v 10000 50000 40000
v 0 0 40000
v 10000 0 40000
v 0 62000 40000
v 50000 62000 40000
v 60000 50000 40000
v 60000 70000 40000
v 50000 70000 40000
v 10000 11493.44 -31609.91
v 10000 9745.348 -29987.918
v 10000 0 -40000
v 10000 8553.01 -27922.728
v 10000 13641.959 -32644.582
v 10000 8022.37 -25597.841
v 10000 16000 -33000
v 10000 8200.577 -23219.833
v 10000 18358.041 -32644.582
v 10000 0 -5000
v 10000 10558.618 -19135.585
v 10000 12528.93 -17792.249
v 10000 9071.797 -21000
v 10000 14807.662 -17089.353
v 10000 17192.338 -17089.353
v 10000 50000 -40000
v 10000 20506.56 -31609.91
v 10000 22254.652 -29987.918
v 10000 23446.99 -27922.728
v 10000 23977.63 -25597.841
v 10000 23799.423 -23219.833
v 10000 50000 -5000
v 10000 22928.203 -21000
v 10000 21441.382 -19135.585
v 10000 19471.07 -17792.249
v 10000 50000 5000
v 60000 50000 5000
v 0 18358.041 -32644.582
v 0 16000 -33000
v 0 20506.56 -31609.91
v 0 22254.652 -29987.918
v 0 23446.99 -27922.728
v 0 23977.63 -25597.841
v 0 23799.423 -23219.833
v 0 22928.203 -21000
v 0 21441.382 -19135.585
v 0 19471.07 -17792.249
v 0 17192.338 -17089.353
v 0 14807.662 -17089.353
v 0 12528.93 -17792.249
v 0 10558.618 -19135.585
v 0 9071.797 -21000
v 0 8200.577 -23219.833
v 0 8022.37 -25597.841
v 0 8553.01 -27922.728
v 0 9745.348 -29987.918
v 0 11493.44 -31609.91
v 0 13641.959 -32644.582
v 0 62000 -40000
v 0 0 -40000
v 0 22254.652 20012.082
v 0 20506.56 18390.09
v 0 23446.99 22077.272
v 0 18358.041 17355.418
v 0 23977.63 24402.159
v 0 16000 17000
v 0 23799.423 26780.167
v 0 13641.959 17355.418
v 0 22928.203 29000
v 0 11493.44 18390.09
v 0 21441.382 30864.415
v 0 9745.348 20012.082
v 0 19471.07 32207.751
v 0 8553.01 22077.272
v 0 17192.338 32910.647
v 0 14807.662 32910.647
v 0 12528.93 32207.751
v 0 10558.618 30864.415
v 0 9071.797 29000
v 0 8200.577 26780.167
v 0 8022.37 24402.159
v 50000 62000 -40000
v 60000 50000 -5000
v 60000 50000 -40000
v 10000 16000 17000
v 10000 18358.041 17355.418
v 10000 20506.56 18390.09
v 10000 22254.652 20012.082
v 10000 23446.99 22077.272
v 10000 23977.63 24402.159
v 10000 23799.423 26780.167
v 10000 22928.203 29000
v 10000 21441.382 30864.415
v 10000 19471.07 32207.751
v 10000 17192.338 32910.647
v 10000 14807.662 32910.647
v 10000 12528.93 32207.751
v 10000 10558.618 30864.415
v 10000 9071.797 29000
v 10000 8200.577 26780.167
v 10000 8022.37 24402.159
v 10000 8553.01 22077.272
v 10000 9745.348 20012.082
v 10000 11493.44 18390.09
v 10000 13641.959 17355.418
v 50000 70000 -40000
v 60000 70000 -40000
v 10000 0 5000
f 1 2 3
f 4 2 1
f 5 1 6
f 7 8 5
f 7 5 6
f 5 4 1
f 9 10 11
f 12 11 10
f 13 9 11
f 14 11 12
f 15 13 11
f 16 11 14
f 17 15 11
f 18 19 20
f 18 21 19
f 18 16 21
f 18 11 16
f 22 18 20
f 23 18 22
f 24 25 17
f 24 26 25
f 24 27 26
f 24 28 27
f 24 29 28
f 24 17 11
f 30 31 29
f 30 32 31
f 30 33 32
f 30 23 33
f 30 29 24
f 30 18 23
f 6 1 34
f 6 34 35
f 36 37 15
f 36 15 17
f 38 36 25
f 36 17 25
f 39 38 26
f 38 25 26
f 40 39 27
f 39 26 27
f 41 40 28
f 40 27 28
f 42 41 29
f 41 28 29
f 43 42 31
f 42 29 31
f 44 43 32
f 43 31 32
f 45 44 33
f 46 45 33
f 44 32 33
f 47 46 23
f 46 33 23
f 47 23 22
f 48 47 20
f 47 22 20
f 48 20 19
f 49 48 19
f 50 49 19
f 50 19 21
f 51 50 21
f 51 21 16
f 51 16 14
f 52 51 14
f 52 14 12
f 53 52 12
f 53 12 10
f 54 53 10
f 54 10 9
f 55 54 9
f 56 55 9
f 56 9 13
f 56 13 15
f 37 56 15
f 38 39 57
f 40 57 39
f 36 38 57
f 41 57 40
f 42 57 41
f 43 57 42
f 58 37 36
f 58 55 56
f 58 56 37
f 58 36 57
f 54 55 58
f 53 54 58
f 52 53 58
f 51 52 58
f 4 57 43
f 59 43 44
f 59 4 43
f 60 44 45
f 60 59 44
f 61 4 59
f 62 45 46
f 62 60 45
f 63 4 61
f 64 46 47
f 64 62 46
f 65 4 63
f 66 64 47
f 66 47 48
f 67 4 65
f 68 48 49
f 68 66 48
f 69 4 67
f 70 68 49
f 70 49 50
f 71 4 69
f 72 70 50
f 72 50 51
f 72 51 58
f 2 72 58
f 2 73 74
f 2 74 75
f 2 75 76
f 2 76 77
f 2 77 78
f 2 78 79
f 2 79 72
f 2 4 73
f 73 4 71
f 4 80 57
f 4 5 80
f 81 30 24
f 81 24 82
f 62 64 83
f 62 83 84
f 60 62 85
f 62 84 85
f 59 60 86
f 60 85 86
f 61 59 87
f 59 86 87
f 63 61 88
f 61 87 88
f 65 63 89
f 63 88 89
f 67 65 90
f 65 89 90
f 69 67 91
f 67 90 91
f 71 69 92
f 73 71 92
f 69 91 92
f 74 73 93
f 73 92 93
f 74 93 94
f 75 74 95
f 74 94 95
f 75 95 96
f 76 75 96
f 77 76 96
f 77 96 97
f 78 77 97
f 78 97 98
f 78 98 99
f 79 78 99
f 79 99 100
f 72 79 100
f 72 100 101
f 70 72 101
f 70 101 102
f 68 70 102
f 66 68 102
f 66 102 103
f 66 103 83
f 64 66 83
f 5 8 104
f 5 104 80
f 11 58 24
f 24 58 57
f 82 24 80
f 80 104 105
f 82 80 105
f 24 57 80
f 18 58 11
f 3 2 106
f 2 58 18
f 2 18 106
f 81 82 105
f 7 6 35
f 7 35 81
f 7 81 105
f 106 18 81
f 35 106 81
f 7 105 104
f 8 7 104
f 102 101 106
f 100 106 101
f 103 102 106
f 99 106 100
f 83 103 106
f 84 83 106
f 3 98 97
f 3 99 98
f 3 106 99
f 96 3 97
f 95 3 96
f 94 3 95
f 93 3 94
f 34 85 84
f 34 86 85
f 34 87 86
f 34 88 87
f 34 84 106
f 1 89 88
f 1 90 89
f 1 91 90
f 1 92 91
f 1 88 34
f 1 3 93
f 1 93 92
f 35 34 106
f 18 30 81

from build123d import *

# Parameters (mm, degrees)
BOSS_EXTRUDE1_DEPTH = 40000
SKETCH2_R           = 8000
CUT_EXTRUDE1_DEPTH  = 94869.329805051
BOSS_EXTRUDE2_START = -45000
BOSS_EXTRUDE2_DEPTH = 10000


with BuildPart() as part:
    # Sketch1 → Boss-Extrude1 (new, symmetric)
    with BuildSketch(Plane.XY):
        Polygon((0, 0), (10000, 0), (10000, 50000), (60000, 50000), (60000, 70000), (50000, 70000), (50000, 62000), (0, 62000), align=None)
    extrude(amount=BOSS_EXTRUDE1_DEPTH, both=True)

    # Sketch2 → Cut-Extrude1 (cut, through all)
    with BuildSketch(Plane(origin=(10000, 0, 0), x_dir=(0, 0, -1), z_dir=(1, 0, 0))):
        with Locations((-25000, 16000)):
            Circle(SKETCH2_R)
        with Locations((25000, 16000)):
            Circle(SKETCH2_R)
    extrude(amount=-CUT_EXTRUDE1_DEPTH, mode=Mode.SUBTRACT)

    # Sketch3 → Boss-Extrude2 (add)
    with BuildSketch(Plane.XY.offset(40000).offset(BOSS_EXTRUDE2_START)):
        Polygon((60000, 50000), (10000, 50000), (10000, 0), align=None)
    extrude(amount=BOSS_EXTRUDE2_DEPTH)


solid = part.part
